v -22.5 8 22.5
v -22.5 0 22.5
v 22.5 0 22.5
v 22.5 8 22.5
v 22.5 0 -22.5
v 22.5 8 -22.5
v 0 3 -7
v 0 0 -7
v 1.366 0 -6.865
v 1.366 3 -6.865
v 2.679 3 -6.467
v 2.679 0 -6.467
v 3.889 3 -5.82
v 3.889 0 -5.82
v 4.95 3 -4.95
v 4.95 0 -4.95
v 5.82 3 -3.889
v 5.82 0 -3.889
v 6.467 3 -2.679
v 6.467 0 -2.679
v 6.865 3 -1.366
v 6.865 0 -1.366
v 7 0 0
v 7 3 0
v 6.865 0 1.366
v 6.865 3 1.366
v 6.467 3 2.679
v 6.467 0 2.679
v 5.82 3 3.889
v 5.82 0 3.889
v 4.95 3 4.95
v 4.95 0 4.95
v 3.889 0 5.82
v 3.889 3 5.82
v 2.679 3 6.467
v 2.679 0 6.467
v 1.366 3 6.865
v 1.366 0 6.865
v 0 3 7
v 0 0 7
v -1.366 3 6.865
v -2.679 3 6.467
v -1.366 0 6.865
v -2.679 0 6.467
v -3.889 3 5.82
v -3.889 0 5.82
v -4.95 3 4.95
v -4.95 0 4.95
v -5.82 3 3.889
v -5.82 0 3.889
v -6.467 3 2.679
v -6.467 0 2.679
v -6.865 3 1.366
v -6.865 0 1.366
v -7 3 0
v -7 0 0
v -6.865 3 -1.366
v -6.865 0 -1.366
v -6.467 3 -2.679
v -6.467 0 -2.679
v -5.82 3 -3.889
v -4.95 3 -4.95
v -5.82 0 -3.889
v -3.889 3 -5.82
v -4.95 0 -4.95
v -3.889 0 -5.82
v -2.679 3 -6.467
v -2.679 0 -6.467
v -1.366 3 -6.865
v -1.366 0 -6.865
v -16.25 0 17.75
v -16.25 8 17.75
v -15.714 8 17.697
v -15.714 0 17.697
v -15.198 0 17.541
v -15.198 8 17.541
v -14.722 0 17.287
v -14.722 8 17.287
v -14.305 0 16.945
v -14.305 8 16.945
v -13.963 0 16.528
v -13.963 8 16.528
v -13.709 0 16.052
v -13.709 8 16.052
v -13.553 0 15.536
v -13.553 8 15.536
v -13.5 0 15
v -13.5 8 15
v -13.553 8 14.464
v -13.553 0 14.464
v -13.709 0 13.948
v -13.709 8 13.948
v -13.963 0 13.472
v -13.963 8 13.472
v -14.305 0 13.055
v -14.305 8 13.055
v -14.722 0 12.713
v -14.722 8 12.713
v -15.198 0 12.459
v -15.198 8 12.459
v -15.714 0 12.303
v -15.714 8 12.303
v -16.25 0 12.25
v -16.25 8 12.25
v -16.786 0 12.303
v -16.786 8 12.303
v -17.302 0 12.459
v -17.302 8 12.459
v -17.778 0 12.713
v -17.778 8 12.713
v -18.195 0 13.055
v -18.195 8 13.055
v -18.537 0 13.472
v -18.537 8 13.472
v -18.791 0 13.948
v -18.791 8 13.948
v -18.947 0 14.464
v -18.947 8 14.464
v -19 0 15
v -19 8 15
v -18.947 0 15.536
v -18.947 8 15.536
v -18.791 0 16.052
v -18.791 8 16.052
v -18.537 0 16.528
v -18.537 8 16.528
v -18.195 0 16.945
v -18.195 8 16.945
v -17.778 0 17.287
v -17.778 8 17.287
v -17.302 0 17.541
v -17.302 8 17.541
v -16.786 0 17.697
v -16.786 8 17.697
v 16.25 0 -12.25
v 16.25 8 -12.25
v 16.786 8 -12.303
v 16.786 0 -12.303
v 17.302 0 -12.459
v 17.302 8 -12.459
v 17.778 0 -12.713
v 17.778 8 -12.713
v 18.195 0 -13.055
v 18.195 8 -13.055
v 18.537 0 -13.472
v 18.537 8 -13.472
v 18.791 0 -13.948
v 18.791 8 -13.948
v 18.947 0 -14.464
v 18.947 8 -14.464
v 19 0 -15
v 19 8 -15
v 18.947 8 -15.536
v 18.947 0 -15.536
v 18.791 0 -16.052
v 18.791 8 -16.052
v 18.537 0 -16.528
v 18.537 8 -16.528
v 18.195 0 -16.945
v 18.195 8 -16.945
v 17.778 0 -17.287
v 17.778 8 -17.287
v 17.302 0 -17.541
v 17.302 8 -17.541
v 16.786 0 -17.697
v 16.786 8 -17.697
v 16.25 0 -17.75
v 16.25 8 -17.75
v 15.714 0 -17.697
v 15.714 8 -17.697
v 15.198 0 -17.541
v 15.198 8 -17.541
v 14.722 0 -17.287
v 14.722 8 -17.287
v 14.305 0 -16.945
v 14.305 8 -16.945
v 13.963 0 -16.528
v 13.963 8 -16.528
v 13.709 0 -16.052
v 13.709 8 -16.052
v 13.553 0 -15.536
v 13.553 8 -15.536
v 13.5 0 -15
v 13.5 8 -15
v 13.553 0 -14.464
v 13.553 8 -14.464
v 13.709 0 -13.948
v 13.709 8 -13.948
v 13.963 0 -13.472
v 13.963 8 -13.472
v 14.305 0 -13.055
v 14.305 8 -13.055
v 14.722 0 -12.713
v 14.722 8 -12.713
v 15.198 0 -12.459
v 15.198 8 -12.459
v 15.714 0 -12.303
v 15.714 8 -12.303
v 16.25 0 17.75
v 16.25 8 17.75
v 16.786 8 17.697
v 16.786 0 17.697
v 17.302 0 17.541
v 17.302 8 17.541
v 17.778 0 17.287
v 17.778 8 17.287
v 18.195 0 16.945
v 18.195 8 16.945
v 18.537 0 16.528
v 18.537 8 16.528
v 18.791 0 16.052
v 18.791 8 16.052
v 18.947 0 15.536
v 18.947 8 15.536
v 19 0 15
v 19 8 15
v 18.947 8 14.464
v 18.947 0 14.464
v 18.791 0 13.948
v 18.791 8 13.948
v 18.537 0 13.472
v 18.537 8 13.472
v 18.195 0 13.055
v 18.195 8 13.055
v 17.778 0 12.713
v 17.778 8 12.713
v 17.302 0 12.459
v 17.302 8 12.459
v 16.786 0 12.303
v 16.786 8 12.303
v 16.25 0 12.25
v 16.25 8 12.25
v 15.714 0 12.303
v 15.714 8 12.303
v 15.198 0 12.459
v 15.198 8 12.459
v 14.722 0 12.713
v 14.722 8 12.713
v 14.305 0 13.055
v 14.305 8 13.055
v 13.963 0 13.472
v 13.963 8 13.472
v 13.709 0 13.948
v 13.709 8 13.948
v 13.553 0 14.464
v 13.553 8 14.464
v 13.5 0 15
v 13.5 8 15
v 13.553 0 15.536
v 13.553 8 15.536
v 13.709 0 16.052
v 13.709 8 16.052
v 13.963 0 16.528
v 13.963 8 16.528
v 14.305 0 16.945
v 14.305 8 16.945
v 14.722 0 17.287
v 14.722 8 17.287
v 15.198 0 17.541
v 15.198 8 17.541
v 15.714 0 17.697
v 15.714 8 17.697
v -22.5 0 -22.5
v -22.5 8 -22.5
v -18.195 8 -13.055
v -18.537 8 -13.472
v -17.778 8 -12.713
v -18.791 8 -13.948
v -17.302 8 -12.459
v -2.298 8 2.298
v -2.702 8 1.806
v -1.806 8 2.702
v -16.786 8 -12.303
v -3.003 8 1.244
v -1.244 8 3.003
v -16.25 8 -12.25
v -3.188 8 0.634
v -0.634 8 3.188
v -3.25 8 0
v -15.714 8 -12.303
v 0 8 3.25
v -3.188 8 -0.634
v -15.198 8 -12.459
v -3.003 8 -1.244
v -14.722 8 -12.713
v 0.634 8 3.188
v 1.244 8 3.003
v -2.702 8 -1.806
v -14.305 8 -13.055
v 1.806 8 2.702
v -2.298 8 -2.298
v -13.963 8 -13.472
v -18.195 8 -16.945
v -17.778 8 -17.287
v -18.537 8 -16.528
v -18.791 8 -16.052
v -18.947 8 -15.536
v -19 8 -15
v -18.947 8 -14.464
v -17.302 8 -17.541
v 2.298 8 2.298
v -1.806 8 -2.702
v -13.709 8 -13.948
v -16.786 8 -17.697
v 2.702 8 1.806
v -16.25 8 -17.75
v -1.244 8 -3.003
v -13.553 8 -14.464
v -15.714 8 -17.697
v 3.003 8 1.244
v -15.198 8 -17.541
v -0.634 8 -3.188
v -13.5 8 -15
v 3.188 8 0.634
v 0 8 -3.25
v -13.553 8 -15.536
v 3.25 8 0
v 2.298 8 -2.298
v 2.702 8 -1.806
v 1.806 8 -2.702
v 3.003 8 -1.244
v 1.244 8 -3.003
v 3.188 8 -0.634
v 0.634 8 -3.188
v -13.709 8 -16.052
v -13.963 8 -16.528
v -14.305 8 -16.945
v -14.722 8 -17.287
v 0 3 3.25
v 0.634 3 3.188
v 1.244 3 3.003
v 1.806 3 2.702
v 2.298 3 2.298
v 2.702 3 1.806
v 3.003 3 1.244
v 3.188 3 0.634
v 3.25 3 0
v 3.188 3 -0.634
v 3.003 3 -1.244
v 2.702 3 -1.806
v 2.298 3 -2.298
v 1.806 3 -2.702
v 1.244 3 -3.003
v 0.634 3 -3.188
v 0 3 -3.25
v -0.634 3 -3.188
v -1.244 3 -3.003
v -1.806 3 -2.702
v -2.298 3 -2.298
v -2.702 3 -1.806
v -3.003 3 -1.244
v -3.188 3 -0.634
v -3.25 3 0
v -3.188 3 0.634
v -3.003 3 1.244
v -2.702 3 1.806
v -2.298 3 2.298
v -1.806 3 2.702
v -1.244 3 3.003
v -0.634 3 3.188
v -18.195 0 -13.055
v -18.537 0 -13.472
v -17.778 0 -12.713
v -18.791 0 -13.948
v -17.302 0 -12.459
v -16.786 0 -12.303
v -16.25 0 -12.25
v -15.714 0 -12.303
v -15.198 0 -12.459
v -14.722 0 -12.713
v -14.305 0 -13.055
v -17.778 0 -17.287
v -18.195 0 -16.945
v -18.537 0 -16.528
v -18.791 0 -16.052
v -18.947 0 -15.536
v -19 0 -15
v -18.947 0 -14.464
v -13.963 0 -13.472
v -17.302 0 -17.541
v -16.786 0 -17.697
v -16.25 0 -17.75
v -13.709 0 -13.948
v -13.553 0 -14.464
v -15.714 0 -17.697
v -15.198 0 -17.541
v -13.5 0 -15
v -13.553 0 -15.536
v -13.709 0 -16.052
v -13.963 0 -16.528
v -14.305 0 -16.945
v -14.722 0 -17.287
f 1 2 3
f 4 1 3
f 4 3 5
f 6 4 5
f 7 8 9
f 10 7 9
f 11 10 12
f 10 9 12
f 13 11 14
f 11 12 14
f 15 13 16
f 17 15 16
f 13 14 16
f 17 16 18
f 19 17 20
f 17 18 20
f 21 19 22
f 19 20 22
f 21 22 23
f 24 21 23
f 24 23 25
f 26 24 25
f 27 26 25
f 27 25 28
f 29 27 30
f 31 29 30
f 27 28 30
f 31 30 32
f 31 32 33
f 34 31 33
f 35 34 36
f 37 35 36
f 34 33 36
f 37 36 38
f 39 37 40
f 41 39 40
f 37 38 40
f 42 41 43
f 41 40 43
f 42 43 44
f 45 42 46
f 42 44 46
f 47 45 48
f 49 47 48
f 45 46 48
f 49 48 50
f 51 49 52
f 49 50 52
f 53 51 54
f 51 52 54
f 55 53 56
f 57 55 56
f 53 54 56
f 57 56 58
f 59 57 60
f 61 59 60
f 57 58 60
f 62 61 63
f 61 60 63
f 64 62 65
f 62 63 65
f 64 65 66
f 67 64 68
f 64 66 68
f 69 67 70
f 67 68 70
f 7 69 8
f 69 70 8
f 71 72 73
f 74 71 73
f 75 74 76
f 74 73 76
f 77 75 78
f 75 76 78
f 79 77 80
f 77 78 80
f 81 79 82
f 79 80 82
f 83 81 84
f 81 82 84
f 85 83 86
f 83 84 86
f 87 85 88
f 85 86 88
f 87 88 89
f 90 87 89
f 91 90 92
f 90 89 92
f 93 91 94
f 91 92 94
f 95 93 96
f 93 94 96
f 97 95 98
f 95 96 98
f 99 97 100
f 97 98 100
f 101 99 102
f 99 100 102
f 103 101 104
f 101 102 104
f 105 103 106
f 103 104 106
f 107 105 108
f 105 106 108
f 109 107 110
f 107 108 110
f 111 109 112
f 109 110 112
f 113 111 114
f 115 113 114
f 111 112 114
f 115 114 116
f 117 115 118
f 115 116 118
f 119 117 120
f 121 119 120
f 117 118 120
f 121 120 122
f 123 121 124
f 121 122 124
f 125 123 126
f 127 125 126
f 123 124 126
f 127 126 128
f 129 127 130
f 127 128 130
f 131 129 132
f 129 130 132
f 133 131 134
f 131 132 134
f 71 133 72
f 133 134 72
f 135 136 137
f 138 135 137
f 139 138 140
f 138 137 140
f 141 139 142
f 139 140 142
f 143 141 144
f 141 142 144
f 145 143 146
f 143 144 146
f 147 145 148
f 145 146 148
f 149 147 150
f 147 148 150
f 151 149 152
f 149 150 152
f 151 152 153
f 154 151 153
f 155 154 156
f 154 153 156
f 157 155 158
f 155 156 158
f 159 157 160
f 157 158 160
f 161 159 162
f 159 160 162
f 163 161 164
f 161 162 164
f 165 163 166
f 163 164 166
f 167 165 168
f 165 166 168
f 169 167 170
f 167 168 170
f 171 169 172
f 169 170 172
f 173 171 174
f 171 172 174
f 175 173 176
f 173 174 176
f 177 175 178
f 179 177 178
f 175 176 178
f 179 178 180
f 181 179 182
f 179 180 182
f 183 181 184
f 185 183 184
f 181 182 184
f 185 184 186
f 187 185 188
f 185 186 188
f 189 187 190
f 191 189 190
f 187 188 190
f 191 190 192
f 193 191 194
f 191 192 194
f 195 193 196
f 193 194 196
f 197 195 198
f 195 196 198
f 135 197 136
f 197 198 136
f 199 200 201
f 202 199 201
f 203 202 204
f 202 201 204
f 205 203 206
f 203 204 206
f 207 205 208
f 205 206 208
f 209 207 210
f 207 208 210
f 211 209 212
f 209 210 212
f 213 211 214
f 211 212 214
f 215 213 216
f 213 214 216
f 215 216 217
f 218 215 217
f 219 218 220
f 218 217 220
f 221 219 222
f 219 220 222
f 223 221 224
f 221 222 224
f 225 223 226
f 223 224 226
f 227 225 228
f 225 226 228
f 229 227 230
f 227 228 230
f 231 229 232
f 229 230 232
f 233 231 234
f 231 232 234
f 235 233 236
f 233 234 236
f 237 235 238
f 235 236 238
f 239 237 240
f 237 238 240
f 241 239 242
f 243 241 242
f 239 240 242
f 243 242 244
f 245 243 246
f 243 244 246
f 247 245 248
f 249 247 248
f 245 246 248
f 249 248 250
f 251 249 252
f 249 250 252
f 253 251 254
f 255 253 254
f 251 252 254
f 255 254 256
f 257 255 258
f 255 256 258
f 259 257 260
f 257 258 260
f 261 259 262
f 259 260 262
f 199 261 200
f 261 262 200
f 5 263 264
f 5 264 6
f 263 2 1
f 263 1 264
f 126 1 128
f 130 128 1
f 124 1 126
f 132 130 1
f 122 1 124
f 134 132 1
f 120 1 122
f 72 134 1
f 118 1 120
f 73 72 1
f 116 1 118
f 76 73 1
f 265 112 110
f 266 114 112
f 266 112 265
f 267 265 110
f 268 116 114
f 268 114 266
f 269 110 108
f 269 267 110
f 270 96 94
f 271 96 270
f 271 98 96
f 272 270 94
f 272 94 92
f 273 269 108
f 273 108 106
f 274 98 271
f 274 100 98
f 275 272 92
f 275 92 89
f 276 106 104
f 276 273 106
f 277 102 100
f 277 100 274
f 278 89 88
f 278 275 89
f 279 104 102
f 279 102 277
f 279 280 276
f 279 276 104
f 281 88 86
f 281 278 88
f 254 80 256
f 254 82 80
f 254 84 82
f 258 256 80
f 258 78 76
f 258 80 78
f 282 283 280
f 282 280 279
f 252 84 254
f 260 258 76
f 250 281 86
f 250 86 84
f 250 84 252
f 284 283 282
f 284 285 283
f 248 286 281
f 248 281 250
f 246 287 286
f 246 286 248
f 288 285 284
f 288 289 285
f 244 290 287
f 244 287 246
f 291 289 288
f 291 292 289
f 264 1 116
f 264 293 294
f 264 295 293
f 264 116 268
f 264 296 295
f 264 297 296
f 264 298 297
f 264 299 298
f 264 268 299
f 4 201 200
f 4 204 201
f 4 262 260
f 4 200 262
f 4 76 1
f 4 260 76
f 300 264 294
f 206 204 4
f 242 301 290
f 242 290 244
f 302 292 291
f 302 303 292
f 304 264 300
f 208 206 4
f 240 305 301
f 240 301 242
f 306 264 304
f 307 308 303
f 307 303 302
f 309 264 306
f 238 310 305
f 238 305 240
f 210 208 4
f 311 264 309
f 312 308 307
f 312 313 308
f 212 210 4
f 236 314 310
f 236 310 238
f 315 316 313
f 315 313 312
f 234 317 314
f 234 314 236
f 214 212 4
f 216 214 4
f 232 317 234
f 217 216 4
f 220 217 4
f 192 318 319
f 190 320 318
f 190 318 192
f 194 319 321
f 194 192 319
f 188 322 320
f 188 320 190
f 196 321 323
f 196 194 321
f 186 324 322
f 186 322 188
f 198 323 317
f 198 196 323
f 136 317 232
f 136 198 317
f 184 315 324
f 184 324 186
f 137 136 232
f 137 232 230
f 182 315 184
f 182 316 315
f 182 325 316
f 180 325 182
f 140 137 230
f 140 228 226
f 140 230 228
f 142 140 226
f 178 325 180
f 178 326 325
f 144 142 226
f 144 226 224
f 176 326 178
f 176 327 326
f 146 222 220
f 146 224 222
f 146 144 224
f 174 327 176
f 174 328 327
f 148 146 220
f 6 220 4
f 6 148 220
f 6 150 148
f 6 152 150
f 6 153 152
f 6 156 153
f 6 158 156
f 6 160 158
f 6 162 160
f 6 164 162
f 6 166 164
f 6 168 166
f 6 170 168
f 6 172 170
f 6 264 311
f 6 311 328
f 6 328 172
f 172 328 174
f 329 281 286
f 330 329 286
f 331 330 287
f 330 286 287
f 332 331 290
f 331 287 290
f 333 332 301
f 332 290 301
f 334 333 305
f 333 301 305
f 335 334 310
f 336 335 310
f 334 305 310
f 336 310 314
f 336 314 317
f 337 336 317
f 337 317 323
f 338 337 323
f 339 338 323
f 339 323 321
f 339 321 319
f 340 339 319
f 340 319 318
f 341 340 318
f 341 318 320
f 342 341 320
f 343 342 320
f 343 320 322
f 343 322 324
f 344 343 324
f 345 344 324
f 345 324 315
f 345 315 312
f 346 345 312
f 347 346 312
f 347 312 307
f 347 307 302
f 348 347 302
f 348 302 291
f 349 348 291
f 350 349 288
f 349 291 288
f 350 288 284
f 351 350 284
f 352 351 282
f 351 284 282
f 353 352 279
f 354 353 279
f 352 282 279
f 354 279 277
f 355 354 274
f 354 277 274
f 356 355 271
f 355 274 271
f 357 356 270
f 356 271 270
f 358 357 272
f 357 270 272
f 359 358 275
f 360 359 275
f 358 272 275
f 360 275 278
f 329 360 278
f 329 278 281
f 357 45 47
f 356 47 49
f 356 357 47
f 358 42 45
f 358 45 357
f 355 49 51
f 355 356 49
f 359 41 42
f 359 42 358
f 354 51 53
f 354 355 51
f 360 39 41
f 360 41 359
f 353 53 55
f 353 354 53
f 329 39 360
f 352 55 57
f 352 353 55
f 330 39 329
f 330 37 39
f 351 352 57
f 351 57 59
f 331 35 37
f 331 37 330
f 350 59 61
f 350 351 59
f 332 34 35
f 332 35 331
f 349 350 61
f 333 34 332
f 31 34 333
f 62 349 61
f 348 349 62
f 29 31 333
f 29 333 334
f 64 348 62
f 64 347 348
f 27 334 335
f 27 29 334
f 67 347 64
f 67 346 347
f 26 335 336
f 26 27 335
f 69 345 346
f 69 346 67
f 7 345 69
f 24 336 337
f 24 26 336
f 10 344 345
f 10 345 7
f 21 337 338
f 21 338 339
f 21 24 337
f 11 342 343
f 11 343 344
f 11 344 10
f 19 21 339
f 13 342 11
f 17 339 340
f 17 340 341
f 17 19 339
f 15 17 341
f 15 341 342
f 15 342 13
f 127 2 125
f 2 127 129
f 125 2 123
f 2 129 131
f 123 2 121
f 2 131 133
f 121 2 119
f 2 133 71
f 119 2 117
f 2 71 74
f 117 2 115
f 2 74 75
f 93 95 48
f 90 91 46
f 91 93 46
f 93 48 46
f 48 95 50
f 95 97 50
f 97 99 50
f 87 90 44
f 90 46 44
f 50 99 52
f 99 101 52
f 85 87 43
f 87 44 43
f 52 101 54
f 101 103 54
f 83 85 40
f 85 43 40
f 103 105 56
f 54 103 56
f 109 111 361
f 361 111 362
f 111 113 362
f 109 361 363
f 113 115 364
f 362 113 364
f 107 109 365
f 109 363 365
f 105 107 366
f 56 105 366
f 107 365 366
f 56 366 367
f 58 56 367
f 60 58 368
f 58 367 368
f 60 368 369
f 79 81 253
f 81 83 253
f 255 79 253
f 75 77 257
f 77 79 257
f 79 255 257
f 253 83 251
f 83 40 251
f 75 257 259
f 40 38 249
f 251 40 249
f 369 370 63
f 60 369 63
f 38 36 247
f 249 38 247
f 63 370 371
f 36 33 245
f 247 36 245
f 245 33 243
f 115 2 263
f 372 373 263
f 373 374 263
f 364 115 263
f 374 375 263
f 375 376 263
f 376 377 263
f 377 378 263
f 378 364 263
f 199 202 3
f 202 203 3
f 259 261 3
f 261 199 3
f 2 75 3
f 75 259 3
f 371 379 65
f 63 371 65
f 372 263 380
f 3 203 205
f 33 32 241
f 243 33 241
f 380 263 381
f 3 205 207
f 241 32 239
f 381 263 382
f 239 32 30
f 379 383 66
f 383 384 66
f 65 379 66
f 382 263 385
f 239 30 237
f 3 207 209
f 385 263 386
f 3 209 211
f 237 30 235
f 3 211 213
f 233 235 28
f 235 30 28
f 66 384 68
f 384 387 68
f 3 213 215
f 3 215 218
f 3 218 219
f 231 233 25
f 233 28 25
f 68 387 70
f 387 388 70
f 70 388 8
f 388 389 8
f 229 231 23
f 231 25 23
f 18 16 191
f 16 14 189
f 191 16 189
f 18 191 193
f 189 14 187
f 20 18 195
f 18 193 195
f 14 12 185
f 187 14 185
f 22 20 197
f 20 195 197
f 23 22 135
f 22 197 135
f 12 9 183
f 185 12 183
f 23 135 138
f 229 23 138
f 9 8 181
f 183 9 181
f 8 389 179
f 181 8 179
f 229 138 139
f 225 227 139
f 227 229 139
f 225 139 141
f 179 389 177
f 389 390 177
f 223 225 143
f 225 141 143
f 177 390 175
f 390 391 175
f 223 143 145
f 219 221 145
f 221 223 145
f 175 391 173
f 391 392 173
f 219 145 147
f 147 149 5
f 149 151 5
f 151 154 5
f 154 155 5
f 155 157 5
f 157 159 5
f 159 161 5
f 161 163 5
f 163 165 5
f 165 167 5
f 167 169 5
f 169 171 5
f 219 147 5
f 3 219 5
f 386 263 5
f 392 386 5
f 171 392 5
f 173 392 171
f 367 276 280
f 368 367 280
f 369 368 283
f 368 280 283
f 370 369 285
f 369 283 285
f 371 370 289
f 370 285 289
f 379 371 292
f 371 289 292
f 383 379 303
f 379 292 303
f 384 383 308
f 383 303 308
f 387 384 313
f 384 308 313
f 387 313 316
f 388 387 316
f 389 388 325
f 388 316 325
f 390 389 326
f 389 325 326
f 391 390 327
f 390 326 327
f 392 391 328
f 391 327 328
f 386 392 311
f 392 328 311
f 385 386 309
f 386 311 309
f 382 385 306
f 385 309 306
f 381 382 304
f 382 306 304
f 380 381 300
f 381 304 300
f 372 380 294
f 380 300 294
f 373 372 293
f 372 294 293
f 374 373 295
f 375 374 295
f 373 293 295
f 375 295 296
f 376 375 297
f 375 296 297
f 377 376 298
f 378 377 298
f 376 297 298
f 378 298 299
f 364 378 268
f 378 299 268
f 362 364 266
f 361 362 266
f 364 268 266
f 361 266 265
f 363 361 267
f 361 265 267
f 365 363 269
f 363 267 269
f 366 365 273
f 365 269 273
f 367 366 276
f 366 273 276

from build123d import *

# Parameters (mm, degrees)
SKETCH_1_W          = 45
SKETCH_1_H          = 45
EXTRUDE_1_DEPTH     = 8
SKETCH_2_R          = 2.75
CUT_EXTRUDE_1_DEPTH = 8
SKETCH_3_R          = 3.25
CUT_EXTRUDE_2_DEPTH = 8
SKETCH_4_R          = 7
CUT_EXTRUDE_3_DEPTH = 3


with BuildPart() as part:
    # 草图1 → 凸台-拉伸1 (new body)
    with BuildSketch(Plane(origin=(0, 0, 0), x_dir=(1, 0, 0), z_dir=(0, 1, 0))):
        Rectangle(SKETCH_1_W, SKETCH_1_H)
    extrude(amount=EXTRUDE_1_DEPTH)

    # 草图2 → 切除-拉伸1 (cut)
    with BuildSketch(Plane(origin=(0, 8, 0), x_dir=(1, 0, 0), z_dir=(0, 1, 0))):
        with Locations(Location((-16.25, 15, 0), (0, 0, 270))):
            Circle(SKETCH_2_R)
        with Locations(Location((16.25, 15, 0), (0, 0, 270))):
            Circle(SKETCH_2_R)
        with Locations(Location((16.25, -15, 0), (0, 0, 270))):
            Circle(SKETCH_2_R)
        with Locations(Location((-16.25, -15, 0), (0, 0, 270))):
            Circle(SKETCH_2_R)
    extrude(amount=-CUT_EXTRUDE_1_DEPTH, mode=Mode.SUBTRACT)

    # 草图3 → 切除-拉伸2 (cut)
    with BuildSketch(Plane(origin=(0, 8, 0), x_dir=(1, 0, 0), z_dir=(0, 1, 0))):
        with Locations(Location((0, 0, 0), (0, 0, 270))):
            Circle(SKETCH_3_R)
    extrude(amount=-CUT_EXTRUDE_2_DEPTH, mode=Mode.SUBTRACT)

    # 草图4 → 切除-拉伸3 (cut)
    with BuildSketch(Plane.XZ):
        with Locations(Location((0, 0, 0), (0, 0, 270))):
            Circle(SKETCH_4_R)
    extrude(amount=-CUT_EXTRUDE_3_DEPTH, mode=Mode.SUBTRACT)


solid = part.part
